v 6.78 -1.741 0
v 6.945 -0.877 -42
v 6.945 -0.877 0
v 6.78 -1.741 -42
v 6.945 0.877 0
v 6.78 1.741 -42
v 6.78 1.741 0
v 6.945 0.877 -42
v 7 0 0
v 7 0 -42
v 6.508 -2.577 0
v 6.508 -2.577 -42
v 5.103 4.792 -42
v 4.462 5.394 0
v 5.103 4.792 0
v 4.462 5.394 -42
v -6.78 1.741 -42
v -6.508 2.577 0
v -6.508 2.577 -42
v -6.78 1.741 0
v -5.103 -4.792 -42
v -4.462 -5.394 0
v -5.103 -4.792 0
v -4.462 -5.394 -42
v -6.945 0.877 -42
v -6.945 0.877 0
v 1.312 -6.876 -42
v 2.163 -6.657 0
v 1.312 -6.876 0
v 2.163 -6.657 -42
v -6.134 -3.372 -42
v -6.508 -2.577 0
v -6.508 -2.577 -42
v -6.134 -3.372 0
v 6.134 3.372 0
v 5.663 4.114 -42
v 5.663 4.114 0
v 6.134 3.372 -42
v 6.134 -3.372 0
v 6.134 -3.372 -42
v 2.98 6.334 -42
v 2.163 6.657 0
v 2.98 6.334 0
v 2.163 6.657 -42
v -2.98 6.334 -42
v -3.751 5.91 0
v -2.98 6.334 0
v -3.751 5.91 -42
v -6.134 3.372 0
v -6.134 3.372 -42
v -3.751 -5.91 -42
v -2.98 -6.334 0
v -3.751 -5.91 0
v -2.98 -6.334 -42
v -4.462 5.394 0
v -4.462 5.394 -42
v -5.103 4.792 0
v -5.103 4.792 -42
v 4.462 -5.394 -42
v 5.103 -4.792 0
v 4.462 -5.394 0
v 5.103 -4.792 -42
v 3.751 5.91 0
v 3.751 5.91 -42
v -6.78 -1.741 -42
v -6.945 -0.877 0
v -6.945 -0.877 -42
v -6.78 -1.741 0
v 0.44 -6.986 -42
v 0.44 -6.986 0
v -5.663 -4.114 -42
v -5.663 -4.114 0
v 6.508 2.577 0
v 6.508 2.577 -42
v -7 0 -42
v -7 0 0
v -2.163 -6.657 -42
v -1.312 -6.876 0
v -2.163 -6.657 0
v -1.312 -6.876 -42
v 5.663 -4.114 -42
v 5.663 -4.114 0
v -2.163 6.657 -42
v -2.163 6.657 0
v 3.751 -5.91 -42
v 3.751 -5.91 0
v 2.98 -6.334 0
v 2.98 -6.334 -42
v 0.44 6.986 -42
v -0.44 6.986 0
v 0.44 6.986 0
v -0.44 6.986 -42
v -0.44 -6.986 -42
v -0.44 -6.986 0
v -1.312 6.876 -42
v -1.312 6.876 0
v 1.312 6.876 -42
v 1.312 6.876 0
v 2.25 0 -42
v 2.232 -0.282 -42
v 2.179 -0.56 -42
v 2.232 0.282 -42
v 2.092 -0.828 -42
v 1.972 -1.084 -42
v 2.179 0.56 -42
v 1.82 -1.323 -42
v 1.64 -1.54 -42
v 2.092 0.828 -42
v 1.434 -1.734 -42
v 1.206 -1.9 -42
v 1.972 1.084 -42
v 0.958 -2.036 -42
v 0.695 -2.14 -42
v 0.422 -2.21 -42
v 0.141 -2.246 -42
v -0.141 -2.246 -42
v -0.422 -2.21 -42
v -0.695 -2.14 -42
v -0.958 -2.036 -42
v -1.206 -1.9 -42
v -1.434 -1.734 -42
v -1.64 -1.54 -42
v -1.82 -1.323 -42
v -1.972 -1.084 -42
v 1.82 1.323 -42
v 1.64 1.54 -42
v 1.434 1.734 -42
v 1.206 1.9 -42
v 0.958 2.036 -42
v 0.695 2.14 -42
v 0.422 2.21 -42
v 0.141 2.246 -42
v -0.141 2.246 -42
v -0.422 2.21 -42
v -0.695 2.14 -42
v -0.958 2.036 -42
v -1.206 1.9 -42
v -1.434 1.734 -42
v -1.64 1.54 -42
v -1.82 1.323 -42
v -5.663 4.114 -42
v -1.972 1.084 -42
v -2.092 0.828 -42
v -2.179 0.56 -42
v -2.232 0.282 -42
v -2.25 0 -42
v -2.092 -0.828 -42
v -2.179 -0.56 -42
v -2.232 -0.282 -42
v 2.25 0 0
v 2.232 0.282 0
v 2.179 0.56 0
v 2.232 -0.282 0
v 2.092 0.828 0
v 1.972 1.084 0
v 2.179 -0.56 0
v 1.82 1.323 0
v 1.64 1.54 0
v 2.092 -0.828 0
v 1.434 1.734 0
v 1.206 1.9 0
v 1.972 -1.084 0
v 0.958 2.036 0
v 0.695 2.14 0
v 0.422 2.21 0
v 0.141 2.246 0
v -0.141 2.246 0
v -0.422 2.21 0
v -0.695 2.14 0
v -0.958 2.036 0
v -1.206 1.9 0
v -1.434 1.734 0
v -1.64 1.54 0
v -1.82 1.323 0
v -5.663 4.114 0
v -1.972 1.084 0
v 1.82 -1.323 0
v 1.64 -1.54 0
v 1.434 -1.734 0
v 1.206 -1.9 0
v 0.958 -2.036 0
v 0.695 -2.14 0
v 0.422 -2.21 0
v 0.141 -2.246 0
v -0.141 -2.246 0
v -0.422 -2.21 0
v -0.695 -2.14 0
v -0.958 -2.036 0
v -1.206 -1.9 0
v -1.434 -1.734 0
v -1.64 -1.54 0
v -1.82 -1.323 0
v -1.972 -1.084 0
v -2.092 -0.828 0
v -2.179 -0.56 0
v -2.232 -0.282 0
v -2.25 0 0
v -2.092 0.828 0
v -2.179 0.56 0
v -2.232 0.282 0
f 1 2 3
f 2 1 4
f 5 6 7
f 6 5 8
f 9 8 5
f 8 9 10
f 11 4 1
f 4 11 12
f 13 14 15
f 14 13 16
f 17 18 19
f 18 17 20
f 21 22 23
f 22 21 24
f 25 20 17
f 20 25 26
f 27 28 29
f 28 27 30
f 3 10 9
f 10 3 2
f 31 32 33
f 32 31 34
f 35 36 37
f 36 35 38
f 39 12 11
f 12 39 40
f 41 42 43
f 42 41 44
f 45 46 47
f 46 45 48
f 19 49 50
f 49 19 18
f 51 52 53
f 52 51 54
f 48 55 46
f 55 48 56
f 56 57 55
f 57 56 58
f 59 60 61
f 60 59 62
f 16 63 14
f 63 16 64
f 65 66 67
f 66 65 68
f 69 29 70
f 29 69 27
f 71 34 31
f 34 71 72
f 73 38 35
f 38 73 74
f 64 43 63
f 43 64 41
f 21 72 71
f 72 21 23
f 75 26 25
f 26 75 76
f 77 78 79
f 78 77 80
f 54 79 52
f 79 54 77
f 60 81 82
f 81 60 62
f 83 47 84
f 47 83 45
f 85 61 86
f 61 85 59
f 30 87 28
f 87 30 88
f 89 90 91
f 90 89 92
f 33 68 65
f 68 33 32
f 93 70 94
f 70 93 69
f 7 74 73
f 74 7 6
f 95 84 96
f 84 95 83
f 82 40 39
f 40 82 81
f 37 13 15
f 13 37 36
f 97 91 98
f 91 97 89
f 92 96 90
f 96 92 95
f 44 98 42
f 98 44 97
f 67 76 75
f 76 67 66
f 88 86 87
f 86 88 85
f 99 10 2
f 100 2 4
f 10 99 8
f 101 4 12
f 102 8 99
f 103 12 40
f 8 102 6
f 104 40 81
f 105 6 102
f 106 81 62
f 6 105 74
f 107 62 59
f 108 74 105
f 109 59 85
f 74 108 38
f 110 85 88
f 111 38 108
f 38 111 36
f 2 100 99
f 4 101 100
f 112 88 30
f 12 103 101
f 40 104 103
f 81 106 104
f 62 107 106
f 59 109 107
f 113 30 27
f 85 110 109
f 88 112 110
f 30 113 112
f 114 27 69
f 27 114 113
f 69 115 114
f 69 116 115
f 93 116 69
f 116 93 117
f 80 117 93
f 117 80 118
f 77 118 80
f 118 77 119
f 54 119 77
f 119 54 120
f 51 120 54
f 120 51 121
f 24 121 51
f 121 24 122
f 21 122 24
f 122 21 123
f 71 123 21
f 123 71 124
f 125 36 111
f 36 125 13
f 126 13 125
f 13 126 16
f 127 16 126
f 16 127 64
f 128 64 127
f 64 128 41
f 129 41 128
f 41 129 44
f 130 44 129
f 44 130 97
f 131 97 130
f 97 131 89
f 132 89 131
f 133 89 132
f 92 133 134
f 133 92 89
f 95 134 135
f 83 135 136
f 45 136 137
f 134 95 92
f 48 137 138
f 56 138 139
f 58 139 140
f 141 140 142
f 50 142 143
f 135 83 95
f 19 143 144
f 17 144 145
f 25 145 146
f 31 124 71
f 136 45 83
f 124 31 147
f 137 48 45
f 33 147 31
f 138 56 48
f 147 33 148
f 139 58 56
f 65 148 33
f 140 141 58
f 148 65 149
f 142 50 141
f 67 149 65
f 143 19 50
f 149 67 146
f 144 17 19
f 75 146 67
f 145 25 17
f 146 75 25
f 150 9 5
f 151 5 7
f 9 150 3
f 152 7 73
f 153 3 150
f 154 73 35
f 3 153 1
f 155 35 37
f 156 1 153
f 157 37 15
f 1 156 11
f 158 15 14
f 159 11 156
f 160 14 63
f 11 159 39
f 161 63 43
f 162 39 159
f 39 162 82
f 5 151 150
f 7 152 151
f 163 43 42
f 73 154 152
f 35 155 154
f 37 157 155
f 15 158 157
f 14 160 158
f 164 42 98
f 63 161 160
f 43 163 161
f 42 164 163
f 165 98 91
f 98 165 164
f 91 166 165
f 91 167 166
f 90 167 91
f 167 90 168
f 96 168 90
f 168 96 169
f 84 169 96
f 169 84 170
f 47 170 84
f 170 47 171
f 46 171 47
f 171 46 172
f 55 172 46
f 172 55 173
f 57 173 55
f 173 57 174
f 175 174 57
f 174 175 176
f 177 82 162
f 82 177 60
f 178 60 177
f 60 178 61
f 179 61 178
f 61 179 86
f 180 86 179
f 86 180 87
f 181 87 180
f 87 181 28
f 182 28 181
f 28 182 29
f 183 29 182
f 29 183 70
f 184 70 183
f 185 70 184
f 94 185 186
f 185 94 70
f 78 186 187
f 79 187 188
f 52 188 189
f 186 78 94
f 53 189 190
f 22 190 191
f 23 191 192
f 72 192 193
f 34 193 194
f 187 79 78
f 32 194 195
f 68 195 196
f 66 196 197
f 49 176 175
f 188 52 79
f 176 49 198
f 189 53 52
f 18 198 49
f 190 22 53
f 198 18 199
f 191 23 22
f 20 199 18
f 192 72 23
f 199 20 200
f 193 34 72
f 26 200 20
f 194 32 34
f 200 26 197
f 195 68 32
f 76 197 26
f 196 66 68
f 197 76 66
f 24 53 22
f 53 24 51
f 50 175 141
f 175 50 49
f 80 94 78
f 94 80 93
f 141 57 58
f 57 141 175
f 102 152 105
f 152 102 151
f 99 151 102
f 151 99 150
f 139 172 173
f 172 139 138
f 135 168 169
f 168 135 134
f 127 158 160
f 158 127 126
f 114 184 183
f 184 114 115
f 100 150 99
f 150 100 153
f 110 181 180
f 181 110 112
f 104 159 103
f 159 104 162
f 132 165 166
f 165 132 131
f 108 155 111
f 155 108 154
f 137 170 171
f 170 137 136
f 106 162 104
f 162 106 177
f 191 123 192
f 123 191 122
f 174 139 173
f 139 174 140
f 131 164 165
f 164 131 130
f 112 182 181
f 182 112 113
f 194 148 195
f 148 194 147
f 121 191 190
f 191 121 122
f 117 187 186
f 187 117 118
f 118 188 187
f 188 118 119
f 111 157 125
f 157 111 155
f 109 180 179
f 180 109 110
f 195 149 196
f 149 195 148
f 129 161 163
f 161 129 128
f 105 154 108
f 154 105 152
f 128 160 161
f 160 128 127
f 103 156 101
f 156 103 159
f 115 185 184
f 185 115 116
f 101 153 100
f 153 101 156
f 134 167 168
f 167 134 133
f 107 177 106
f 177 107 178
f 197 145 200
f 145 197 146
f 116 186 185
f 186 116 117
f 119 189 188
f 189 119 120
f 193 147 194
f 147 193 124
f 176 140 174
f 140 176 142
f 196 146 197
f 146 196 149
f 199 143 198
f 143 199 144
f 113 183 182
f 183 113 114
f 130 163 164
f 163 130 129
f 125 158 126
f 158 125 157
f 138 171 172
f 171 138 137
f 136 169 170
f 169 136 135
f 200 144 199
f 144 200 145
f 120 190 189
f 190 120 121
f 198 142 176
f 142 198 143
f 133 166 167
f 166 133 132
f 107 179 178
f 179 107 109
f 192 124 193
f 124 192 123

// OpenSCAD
$fn = 50;


difference() {
	union() {
		translate(v = [0, 0, -42.0000000000]) {
			cylinder(h = 42, r = 7.0000000000);
		}
	}
	union() {
		#translate(v = [0, 0, -42]) {
			cylinder(h = 42, r = 2.2500000000);
		}
	}
}
